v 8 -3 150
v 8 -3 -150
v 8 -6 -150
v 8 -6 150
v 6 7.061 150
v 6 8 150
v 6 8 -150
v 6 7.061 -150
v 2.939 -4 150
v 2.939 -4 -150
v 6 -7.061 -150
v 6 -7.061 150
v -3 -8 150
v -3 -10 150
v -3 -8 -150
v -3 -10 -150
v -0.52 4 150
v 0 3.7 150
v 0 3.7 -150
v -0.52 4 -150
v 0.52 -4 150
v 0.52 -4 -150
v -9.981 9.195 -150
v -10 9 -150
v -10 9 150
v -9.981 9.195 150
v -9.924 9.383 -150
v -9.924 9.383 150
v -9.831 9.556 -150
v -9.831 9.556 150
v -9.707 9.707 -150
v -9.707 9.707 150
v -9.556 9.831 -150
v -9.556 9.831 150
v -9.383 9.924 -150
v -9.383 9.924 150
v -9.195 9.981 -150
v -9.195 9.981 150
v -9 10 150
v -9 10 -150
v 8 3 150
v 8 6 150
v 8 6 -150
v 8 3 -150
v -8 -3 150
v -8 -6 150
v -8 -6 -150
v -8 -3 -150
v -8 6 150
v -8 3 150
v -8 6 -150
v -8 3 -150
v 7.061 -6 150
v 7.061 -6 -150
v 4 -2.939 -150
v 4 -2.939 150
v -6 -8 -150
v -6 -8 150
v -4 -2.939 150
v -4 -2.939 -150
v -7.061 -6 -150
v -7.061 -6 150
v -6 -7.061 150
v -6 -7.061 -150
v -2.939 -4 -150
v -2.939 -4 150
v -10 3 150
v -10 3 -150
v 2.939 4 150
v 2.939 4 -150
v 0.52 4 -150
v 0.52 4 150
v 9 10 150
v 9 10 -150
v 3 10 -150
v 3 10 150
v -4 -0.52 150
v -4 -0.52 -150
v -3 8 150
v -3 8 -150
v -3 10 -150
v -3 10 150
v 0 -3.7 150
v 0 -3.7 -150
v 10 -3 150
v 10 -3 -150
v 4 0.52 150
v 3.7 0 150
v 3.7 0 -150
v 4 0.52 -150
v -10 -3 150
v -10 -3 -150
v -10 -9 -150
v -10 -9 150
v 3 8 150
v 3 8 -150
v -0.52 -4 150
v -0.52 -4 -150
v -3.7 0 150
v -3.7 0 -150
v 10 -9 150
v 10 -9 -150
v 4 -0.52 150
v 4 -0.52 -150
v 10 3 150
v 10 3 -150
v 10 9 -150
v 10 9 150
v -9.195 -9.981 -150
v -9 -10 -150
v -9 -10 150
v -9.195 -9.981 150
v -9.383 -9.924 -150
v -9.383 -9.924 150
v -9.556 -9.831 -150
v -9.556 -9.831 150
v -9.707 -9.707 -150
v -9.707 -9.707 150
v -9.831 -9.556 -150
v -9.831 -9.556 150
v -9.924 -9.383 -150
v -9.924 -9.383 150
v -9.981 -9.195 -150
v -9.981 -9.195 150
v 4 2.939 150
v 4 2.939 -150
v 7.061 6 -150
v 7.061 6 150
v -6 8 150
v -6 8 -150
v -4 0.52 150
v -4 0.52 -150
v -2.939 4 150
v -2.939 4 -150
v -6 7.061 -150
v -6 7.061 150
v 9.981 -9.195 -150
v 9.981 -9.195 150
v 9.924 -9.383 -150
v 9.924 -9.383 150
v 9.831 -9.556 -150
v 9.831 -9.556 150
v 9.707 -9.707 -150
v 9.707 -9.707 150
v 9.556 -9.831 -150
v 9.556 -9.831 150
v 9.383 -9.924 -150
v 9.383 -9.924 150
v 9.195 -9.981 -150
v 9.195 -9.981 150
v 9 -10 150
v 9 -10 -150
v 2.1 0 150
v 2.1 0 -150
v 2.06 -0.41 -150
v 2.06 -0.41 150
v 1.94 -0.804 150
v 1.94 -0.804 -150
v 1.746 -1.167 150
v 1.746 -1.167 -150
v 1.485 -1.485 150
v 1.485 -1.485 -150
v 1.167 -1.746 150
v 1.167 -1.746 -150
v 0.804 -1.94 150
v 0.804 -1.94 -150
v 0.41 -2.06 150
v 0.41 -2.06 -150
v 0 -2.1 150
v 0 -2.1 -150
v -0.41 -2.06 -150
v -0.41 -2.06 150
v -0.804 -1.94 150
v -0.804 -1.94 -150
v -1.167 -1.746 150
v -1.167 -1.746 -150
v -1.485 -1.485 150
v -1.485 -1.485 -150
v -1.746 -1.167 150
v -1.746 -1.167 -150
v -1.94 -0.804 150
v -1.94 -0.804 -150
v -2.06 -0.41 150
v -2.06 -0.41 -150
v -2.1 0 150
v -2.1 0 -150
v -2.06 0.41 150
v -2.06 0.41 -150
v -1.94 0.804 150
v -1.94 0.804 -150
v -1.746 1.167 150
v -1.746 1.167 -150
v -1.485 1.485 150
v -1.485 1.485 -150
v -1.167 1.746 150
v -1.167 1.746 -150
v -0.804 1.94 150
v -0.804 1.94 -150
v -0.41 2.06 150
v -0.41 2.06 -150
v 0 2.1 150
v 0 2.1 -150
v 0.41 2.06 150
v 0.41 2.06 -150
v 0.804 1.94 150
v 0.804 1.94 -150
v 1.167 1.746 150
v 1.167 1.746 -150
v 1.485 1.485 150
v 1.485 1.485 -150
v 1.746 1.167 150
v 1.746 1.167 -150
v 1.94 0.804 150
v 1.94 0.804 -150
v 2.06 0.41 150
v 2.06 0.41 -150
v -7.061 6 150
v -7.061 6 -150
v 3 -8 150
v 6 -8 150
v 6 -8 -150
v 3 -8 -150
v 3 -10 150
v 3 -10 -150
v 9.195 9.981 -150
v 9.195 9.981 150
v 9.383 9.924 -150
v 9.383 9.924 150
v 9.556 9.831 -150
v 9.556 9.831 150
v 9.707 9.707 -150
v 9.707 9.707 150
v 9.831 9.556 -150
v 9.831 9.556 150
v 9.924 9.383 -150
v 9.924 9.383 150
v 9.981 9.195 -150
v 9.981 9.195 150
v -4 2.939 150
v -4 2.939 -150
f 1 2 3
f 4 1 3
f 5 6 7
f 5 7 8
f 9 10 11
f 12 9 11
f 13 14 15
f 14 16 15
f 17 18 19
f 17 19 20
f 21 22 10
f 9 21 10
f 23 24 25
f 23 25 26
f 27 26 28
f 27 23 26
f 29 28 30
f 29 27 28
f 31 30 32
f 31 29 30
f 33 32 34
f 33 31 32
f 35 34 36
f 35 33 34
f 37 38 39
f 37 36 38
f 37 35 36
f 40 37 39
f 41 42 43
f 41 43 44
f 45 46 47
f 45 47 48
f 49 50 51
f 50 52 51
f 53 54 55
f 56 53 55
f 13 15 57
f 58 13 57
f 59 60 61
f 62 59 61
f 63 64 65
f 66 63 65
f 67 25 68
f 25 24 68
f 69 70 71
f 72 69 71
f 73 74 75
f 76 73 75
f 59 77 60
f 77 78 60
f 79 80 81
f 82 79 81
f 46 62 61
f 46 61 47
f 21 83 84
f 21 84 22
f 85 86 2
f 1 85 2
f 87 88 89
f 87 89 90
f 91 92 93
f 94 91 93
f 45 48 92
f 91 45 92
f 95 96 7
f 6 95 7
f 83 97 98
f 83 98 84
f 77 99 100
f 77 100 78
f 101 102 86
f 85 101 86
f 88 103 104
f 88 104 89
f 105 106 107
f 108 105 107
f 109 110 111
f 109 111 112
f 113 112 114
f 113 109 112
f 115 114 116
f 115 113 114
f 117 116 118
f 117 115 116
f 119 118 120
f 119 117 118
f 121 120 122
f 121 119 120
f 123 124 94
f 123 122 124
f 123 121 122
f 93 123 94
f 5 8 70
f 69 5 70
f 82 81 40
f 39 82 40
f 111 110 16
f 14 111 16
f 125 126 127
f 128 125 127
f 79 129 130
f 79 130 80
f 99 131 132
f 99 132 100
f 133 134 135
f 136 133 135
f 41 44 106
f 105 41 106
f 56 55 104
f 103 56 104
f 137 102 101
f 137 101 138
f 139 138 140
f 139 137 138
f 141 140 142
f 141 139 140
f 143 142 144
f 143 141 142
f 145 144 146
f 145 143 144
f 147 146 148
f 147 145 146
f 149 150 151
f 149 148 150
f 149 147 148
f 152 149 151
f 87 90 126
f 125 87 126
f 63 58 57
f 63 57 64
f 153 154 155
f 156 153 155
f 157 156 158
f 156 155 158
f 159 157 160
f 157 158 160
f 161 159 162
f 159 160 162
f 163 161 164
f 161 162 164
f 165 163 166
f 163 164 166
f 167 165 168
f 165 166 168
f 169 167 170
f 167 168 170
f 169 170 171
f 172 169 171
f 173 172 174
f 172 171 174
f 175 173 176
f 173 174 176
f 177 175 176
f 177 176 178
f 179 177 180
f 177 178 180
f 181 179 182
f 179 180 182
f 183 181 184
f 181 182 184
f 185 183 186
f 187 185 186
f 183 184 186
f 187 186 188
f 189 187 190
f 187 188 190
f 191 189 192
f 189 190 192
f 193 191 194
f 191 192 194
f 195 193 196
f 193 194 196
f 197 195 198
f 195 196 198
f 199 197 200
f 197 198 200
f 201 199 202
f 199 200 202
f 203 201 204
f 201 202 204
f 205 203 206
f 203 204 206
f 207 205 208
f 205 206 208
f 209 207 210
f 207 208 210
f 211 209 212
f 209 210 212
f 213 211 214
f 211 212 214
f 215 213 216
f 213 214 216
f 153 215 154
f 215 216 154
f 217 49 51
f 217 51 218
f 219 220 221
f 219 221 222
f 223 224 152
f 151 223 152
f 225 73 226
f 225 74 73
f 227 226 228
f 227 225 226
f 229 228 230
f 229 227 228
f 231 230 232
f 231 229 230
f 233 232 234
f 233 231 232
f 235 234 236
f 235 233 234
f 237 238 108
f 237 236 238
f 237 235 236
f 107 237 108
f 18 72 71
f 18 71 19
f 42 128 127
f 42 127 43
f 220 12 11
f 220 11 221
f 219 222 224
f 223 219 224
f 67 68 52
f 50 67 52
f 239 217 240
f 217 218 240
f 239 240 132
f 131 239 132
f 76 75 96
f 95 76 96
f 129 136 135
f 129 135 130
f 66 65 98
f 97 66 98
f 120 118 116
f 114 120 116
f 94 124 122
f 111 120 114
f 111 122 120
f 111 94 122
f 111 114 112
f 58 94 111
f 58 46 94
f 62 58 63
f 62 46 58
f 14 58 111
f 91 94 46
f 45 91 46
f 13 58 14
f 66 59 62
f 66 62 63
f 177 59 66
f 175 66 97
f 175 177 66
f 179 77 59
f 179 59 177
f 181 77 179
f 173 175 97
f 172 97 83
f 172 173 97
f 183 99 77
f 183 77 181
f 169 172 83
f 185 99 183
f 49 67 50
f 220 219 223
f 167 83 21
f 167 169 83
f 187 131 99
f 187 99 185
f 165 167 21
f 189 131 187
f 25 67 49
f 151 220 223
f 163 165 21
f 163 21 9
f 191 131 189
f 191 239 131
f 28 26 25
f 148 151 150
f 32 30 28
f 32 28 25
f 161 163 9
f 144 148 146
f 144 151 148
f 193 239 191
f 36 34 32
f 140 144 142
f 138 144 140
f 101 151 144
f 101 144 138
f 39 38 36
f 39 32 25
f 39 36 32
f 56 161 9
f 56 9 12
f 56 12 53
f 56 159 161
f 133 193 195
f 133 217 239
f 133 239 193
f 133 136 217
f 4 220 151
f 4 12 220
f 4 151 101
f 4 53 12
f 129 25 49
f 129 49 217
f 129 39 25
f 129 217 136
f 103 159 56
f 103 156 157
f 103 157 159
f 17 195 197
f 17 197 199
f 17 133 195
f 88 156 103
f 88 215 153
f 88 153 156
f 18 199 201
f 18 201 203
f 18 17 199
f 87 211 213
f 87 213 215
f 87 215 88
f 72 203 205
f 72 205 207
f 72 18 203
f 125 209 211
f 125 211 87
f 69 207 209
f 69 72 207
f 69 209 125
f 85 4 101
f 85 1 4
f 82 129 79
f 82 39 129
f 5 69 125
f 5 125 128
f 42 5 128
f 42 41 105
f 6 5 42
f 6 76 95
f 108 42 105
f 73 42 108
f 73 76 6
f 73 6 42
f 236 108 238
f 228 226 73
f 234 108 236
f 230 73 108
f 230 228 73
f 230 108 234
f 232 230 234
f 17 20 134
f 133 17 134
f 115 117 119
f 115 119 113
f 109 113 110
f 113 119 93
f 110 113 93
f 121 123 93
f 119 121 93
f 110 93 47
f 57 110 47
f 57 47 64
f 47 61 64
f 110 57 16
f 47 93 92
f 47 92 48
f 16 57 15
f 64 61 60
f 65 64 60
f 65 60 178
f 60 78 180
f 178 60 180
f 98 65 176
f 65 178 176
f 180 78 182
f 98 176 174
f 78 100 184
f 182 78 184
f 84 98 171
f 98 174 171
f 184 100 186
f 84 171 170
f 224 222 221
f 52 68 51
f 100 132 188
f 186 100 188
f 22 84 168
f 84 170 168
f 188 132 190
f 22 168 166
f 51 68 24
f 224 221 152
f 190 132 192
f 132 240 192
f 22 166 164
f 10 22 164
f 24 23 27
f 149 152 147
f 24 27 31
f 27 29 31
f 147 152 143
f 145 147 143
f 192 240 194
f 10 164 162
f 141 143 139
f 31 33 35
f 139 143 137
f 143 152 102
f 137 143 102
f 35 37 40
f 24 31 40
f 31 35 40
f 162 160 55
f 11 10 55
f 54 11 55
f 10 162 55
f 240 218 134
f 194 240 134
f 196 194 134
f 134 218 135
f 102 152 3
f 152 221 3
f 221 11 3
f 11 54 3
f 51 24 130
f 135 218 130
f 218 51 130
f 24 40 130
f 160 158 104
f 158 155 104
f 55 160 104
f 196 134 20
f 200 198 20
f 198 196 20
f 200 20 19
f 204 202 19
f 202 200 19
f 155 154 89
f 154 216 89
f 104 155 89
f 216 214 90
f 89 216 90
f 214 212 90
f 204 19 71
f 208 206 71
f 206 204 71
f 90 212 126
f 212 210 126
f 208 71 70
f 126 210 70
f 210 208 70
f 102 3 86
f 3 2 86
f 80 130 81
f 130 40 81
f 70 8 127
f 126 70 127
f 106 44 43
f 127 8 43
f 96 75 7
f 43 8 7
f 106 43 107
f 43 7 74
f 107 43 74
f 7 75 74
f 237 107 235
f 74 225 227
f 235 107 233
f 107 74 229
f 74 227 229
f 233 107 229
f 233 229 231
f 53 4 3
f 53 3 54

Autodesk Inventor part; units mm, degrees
ref_plane "YZ Plane" through (0, 0, 0) normal (1, 0, 0) x (0, 1, 0)
ref_plane "XZ Plane" through (0, 0, 0) normal (0, 1, 0) x (-1, 0, 0)
ref_plane "XY Plane" through (0, 0, 0) normal (0, 0, 1) x (1, 0, 0)
sketch "Sketch1" plane through (0, 0, 0) normal (0, 0, 1) x (1, 0, 0)
  line L0 (-2.205, 0) -> (2.205, 0)
  line L1 (0, -2.205) -> (0, 2.205)
  arc A0 (9, -10) -> (10, -9) centre (9, -9) ccw
  line L2 (-10, 9) -> (-10, 3)
  line L3 (-10, 3) -> (-8, 3)
  line L4 (-8, 3) -> (-8, 6)
  line L5 (-8, 6) -> (-7.0607, 6)
  line L6 (-7.0607, 6) -> (-4, 2.9393)
  line L7 (-4, 2.9393) -> (-4, 0.5196)
  line L8 (-4, 0.5196) -> (-3.7, 0)
  line L9 (-3.7, 0) -> (-4, -0.5196)
  line L10 (-4, -0.5196) -> (-4, -2.9393)
  line L11 (-4, -2.9393) -> (-7.0607, -6)
  line L12 (-7.0607, -6) -> (-8, -6)
  line L13 (-8, -6) -> (-8, -3)
  line L14 (-8, -3) -> (-10, -3)
  line L15 (-10, -3) -> (-10, -9)
  arc A1 (-10, -9) -> (-9, -10) centre (-9, -9) ccw
  line L16 (-9, -10) -> (-3, -10)
  line L17 (-3, -10) -> (-3, -8)
  line L18 (-3, -8) -> (-6, -8)
  line L19 (-6, -7.0607) -> (-2.9393, -4)
  line L20 (-2.9393, -4) -> (-0.5196, -4)
  line L21 (-0.5196, -4) -> (0, -3.7)
  line L22 (0, -3.7) -> (0.5196, -4)
  line L23 (0.5196, -4) -> (2.9393, -4)
  line L24 (2.9393, -4) -> (6, -7.0607)
  line L25 (6, -7.0607) -> (6, -8)
  line L26 (6, -8) -> (3, -8)
  line L27 (3, -8) -> (3, -10)
  line L28 (3, -10) -> (9, -10)
  line L29 (10, -9) -> (10, -3)
  line L30 (10, -3) -> (8, -3)
  line L31 (8, -3) -> (8, -6)
  line L32 (8, -6) -> (7.0607, -6)
  line L33 (7.0607, -6) -> (4, -2.9393)
  line L34 (4, -2.9393) -> (4, -0.5196)
  line L35 (4, -0.5196) -> (3.7, 0)
  line L36 (3.7, 0) -> (4, 0.5196)
  line L37 (4, 0.5196) -> (4, 2.9393)
  line L38 (4, 2.9393) -> (7.0607, 6)
  line L39 (7.0607, 6) -> (8, 6)
  line L40 (8, 6) -> (8, 3)
  line L41 (8, 3) -> (10, 3)
  line L42 (10, 3) -> (10, 9)
  arc A2 (10, 9) -> (9, 10) centre (9, 9) ccw
  line L43 (9, 10) -> (3, 10)
  line L44 (3, 10) -> (3, 8)
  line L45 (3, 8) -> (6, 8)
  line L46 (6, 8) -> (6, 7.0607)
  line L47 (6, 7.0607) -> (2.9393, 4)
  line L48 (2.9393, 4) -> (0.5196, 4)
  line L49 (0.5196, 4) -> (0, 3.7)
  line L50 (0, 3.7) -> (-0.5196, 4)
  line L51 (-0.5196, 4) -> (-2.9393, 4)
  line L52 (-2.9393, 4) -> (-6, 7.0607)
  line L53 (-6, 7.0607) -> (-6, 8)
  line L54 (-6, 8) -> (-3, 8)
  line L55 (-3, 8) -> (-3, 10)
  line L56 (-3, 10) -> (-9, 10)
  arc A3 (-9, 10) -> (-10, 9) centre (-9, 9) ccw
  circle A4 centre (0, 0) radius 2.1
  line L57 (-6, -8) -> (-6, -7.0607)
extrude "Extrusion1" add sketch "Sketch1" along normal mid plane 300
equation "\"d0\" = height"
equation "\"height\" = 300"
equation "\"facingThickness\" = 12.7"
equation "\"facingGasketThickness\" = 1.5875"
properties part number "HFS5-2020" material "Aluminum 6061"
